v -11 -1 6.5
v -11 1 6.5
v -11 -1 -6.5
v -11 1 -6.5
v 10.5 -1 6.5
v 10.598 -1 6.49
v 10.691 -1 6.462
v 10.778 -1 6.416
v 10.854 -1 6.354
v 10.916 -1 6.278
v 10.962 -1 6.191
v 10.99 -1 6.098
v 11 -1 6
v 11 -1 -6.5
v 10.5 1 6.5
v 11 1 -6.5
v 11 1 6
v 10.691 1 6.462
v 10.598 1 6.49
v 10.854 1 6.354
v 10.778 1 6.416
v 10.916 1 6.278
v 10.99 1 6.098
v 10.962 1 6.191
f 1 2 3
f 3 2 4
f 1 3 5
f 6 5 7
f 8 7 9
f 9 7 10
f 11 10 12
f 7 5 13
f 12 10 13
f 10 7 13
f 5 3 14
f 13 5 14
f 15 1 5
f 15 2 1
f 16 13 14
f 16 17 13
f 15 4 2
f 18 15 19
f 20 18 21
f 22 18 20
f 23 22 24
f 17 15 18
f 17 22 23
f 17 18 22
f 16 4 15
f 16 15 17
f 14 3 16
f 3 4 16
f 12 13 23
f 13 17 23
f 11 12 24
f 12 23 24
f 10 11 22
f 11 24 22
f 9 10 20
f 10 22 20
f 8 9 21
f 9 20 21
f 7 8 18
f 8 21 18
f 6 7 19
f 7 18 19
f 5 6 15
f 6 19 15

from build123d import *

# Parameters (mm, degrees)
SKETCH1_W           = 22
SKETCH1_H           = 13
BOSS_EXTRUDE1_DEPTH = 1
FILLET1_R           = 0.5


with BuildPart() as part:
    # Sketch1 → Boss-Extrude1 (new, symmetric)
    with BuildSketch(Plane(origin=(0, 0, 0), x_dir=(1, 0, 0), z_dir=(0, 1, 0))):
        Rectangle(SKETCH1_W, SKETCH1_H)
    extrude(amount=BOSS_EXTRUDE1_DEPTH, both=True)

    # Fillet1
    fillet1_edges = [part.edges().sort_by_distance(p)[0] for p in [
        (11, 0, 6.5),
    ]]
    fillet(fillet1_edges, radius=FILLET1_R)


solid = part.part
